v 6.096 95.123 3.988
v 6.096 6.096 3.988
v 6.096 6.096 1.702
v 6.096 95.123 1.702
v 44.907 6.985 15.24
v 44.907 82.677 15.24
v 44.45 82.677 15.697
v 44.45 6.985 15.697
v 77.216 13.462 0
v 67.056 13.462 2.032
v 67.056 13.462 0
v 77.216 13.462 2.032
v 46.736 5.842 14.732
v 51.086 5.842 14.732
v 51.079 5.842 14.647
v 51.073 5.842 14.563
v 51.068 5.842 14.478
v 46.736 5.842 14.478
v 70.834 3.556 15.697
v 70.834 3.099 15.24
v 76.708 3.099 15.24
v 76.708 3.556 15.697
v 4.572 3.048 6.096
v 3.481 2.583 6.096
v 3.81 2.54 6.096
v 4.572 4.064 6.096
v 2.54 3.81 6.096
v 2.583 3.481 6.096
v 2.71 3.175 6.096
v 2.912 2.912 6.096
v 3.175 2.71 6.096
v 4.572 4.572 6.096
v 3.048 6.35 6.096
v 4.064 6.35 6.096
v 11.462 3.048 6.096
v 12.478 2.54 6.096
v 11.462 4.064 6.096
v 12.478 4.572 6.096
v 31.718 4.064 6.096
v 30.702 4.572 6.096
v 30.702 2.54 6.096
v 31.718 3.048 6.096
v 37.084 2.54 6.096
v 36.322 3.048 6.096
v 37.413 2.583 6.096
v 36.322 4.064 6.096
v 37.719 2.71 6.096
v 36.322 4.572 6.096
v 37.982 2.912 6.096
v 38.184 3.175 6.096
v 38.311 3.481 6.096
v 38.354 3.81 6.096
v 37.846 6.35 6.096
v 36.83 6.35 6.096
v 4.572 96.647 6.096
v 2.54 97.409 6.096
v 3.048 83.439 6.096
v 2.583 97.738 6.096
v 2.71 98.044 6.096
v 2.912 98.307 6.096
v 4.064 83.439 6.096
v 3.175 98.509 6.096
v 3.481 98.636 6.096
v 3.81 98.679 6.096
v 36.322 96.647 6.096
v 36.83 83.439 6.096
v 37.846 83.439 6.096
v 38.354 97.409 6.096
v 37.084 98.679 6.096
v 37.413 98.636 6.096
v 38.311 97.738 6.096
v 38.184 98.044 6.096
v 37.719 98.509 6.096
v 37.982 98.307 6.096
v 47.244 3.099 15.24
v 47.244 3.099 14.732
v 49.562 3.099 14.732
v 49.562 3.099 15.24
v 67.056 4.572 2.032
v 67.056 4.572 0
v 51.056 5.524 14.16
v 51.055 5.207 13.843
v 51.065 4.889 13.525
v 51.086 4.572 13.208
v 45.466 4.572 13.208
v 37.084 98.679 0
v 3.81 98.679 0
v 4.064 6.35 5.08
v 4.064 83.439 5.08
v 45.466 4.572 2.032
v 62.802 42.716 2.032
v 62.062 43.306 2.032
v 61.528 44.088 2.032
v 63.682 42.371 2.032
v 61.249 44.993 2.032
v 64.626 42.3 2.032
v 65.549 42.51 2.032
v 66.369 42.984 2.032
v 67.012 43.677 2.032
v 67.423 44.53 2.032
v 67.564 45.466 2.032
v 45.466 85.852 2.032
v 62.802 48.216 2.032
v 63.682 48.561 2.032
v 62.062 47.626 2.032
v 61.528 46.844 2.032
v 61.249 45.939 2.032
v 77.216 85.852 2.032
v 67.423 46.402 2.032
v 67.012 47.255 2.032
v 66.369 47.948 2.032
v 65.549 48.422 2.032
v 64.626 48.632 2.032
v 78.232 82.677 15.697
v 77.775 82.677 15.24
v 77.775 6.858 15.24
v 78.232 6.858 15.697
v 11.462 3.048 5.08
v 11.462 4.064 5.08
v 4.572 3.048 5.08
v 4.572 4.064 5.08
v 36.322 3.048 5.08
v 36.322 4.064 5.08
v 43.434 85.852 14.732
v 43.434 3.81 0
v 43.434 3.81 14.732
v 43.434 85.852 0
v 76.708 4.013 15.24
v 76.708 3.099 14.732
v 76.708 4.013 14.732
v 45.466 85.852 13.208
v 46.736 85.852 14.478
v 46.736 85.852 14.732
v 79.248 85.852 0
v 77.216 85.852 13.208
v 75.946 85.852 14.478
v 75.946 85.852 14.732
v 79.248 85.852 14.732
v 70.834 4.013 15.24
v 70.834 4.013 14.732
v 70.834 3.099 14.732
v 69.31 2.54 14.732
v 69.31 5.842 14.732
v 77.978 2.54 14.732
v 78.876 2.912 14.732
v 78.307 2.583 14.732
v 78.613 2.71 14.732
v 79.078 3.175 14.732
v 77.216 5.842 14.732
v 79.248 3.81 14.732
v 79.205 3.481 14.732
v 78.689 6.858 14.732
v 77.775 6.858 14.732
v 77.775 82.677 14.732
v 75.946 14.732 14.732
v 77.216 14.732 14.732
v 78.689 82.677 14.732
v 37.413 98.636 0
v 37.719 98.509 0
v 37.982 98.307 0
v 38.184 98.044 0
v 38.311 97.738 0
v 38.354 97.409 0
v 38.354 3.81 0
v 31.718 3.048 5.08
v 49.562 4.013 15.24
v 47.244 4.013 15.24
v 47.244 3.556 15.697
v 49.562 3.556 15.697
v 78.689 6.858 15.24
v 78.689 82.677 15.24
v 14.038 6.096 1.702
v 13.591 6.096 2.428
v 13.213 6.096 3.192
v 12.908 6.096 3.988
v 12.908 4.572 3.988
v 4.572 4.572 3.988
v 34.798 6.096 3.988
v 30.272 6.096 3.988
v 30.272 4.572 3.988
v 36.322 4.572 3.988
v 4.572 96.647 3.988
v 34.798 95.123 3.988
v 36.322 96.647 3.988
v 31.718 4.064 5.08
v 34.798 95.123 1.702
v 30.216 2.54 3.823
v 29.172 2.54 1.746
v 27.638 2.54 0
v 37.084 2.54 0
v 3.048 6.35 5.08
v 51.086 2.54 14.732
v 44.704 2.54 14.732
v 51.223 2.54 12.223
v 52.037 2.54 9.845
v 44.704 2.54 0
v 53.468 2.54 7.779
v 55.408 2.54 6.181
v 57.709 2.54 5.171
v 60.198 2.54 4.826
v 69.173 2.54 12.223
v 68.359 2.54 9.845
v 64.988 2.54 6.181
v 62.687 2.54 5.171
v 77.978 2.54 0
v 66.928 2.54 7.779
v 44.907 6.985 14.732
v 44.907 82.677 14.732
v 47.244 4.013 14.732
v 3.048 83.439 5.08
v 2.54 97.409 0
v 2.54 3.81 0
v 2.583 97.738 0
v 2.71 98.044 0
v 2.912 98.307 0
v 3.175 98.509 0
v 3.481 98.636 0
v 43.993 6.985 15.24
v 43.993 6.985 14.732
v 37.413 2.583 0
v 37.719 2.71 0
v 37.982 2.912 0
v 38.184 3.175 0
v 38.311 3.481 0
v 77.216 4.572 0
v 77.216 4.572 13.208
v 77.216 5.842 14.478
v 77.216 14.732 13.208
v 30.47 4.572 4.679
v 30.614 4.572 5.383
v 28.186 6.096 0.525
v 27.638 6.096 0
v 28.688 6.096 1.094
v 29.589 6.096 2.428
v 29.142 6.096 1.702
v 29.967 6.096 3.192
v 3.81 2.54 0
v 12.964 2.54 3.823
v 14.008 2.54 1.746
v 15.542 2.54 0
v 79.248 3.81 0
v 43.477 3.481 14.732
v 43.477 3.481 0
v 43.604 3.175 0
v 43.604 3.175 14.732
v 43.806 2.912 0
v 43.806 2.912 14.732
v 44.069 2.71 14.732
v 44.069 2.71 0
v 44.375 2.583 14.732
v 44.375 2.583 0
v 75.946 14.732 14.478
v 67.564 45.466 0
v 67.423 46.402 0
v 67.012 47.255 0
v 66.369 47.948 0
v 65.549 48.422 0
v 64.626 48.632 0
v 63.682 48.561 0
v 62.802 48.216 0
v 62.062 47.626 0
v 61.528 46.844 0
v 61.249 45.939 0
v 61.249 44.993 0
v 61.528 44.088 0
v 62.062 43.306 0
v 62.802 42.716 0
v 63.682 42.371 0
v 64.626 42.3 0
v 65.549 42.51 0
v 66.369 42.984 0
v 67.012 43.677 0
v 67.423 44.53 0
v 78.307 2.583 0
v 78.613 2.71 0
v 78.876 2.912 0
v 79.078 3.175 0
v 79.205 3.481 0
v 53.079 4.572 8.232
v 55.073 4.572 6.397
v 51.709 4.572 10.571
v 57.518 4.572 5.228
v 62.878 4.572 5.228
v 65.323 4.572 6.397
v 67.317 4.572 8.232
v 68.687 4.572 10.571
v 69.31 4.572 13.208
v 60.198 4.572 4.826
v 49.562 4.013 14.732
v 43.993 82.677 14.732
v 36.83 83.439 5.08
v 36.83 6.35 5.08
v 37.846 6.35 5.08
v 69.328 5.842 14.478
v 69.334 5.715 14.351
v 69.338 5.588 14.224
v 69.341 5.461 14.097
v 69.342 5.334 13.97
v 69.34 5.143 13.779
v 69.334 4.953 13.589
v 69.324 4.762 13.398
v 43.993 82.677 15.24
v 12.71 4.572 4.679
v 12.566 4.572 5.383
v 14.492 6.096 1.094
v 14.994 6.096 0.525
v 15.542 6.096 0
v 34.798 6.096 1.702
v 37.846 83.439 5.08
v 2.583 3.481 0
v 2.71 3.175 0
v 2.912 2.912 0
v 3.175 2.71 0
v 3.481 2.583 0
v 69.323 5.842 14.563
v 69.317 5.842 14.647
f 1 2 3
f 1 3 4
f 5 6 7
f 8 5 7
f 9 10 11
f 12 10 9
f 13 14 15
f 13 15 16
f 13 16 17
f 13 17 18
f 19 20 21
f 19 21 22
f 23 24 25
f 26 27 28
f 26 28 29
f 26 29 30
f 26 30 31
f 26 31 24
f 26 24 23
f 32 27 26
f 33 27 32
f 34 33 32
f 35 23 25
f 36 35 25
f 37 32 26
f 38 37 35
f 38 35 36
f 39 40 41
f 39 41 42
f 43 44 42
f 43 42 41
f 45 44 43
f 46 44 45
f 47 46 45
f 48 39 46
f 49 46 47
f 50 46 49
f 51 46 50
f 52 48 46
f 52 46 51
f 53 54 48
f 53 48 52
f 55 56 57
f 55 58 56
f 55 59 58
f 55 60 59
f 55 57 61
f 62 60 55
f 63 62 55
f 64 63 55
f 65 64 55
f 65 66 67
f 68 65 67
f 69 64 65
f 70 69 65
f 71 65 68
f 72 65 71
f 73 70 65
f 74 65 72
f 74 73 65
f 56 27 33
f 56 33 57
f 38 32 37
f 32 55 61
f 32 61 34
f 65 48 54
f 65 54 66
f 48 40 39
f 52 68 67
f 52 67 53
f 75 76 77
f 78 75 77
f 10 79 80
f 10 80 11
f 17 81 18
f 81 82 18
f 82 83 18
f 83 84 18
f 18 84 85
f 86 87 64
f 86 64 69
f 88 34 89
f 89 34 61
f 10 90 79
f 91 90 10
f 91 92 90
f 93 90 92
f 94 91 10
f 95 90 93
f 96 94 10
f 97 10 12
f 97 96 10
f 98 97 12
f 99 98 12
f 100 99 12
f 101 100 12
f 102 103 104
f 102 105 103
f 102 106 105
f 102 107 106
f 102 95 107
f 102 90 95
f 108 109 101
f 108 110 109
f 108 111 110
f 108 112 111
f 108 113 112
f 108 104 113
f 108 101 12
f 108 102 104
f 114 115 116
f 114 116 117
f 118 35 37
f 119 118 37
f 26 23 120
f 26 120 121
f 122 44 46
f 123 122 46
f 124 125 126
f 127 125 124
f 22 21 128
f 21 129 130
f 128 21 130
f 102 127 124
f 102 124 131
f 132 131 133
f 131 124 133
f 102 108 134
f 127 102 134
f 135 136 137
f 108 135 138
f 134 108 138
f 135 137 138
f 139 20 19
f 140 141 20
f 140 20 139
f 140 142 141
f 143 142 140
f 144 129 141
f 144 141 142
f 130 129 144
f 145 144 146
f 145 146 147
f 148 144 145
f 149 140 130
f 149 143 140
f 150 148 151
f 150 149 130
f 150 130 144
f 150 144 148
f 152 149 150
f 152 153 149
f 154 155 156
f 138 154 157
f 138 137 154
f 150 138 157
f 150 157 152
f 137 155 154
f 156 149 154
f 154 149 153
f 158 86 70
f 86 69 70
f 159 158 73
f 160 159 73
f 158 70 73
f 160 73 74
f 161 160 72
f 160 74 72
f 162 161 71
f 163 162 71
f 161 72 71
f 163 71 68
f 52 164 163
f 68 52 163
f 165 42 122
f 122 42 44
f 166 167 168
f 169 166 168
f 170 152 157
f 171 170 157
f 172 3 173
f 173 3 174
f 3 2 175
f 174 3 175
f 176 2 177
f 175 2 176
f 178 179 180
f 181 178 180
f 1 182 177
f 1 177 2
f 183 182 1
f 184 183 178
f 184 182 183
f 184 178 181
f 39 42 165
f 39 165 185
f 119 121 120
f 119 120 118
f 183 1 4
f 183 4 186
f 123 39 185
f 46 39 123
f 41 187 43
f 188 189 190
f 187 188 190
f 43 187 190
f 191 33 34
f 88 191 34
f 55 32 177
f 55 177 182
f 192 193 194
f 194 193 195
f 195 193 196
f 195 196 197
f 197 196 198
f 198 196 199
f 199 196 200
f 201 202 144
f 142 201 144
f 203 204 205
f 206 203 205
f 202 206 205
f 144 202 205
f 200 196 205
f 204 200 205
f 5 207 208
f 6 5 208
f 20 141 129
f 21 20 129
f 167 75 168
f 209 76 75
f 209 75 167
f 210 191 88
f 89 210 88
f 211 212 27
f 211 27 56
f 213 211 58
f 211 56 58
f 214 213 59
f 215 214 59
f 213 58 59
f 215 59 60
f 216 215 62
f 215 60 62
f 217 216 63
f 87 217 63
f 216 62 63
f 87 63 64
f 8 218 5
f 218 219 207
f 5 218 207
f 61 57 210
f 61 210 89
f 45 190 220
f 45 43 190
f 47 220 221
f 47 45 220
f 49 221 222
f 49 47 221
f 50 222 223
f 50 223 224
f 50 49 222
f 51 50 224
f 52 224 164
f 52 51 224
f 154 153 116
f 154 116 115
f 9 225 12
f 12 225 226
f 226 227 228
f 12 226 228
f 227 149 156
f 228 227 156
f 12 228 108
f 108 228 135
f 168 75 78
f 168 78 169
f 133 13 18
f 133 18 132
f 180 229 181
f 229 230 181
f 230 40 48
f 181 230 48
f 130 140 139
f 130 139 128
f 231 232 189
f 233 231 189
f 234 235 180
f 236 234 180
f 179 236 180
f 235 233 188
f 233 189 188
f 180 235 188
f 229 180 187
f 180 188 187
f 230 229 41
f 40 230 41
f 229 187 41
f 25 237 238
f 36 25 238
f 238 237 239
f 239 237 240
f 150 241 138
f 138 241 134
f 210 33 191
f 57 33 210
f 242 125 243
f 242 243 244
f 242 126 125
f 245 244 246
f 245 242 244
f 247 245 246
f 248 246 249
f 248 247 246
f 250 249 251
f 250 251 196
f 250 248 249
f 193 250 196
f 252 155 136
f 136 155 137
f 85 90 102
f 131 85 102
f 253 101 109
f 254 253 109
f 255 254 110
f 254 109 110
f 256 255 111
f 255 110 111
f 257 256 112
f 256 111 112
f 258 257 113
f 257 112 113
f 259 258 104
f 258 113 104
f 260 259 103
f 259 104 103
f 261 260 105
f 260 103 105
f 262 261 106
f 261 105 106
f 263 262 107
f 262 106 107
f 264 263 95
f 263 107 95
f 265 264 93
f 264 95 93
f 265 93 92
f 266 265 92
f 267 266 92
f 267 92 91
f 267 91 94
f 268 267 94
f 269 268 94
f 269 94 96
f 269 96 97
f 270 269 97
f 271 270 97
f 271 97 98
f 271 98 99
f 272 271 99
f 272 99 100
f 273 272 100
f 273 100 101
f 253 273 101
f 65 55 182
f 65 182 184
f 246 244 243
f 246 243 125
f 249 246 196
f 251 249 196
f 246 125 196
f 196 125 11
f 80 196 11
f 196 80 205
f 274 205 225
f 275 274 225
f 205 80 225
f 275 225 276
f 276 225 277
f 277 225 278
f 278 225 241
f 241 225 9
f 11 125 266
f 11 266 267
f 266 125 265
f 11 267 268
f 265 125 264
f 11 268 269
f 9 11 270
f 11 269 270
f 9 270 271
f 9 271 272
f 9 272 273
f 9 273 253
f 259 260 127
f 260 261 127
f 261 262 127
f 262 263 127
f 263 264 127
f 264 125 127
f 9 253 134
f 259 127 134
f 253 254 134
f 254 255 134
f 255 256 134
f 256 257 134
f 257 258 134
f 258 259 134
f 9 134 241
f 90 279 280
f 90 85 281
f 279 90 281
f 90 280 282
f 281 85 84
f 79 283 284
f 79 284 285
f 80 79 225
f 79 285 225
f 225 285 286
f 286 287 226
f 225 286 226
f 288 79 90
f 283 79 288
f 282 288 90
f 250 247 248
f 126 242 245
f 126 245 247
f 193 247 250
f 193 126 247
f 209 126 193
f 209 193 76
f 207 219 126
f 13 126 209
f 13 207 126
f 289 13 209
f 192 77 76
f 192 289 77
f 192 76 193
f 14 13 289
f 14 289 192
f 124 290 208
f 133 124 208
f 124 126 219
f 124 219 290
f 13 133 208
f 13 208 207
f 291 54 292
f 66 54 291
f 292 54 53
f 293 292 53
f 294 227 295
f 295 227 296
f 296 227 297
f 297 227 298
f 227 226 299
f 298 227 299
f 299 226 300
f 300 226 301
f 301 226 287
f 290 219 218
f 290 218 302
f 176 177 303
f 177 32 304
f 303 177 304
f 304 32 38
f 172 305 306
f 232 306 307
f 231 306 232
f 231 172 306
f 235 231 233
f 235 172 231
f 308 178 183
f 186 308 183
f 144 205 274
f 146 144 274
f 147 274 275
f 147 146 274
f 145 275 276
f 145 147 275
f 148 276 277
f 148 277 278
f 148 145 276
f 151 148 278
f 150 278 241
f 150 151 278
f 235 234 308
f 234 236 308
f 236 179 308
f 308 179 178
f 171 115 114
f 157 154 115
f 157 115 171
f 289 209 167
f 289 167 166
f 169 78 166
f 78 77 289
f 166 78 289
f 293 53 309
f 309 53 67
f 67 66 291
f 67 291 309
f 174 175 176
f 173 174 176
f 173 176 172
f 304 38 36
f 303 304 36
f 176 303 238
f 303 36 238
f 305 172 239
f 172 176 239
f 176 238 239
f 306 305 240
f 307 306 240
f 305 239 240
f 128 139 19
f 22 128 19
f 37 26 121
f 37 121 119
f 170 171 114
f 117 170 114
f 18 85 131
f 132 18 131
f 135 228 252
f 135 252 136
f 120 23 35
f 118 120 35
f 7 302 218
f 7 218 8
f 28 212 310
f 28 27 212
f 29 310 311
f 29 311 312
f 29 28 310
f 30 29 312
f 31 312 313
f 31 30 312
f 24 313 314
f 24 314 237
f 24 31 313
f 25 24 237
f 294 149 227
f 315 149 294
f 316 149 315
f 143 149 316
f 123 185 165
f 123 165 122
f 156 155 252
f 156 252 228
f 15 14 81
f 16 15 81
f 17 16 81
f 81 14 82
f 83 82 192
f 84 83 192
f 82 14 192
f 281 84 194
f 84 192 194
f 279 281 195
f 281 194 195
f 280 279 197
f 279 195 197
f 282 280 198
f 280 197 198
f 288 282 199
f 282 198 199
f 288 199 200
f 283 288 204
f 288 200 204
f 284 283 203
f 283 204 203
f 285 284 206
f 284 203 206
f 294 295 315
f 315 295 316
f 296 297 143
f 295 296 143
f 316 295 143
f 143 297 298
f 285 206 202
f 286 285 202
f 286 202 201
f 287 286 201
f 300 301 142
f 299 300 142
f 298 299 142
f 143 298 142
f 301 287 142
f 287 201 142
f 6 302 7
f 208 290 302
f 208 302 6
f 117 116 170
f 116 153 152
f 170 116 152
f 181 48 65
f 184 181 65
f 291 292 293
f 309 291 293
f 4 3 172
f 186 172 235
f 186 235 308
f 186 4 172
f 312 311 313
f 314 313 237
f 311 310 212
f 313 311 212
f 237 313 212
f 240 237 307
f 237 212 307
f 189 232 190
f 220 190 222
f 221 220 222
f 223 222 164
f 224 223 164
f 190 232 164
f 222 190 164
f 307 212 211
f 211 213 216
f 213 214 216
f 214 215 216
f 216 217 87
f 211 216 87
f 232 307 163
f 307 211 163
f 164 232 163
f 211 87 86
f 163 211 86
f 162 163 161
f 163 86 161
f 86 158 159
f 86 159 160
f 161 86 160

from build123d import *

# Parameters (mm, degrees)
F0_W         = 35.814
F0_H         = 96.139
F1_DEPTH     = 6.096
F2_W         = 28.702
F2_H         = 89.027
F3_DEPTH     = 4.3942
F4_W         = 31.75
F4_H         = 92.075
F4_W_2       = 28.702
F4_H_2       = 89.027
F5_DEPTH     = 2.1082
F6_W         = 35.814
F6_H         = 96.012
F7_DEPTH     = 14.732
F8_T         = -2.032
F9_W         = 35.814
F9_H         = 12.7
F9_W_2       = 10.16
F9_H_2       = 8.89
F9_R         = 3.175
F10_DEPTH    = 14.733
F11_W        = 1.27
F11_H        = 71.12
F12_DEPTH    = 1.524
F13_SIZE     = 1.26999
F14_R        = 1.27
F14_2_R      = 1.27
F15_R        = 9.144
F16_DEPTH    = 96.14
F17_DEPTH    = 3.556
F18_W        = 6.8898053138
F18_H        = 1.016
F18_W_2      = 1.016
F18_H_2      = 77.089
F18_W_3      = 4.6038053138
F19_DEPTH    = 1.016
F20_W        = 2.3178053138
F20_H        = 0.9144
F20_W_2      = 0.9144
F20_H_2      = 75.692
F20_W_3      = 5.8738053138
F20_H_3      = 75.819
F21_DEPTH    = 1.143
F22_T1_DEPTH = 5.5838427085
F22_T3_DEPTH = 78.9580373947
F22_T5_DEPTH = 9.1398427085
F22_T7_DEPTH = 79.0850373947


# Not quite as in the source:
# - a fillet or chamfer that OpenCascade refuses, or shapes differently, is made with other operations: its cross-section is extruded or revolved along the edge and cut away or added
# - a fillet or chamfer is up to 0.001 mm smaller than in the source, because OpenCascade refuses the exact size
# - a feature names something its author has since deleted; it is built from what else it names


with BuildPart() as f1:
    # F0 (on Top) → F1 (new body)
    with BuildSketch(Plane.XY):
        with Locations((20.447, 50.6095)):
            Rectangle(F0_W, F0_H)
    extrude(amount=F1_DEPTH)

    # F2 (on face) → F3 (cut)
    with BuildSketch(Plane.XY.offset(6.096)):
        with Locations((20.447, 50.6095)):
            Rectangle(F2_W, F2_H)
    extrude(amount=-F3_DEPTH, mode=Mode.SUBTRACT)

    # F4 (on face) → F5 (cut)
    with BuildSketch(Plane.XY.offset(6.096)):
        with Locations((20.447, 50.6095)):
            Rectangle(F4_W, F4_H)
        with Locations((20.447, 50.6095)):
            Rectangle(F4_W_2, F4_H_2, mode=Mode.SUBTRACT)
    extrude(amount=-F5_DEPTH, mode=Mode.SUBTRACT)

    # F14
    f14_edges = [f1.edges().sort_by_distance(p)[0] for p in [
        (38.354, 2.54, 3.048),
        (38.354, 98.679, 3.048),
        (2.54, 2.54, 3.048),
        (2.54, 98.679, 3.048),
    ]]
    fillet(f14_edges, radius=F14_R)

    # F15 (on face) → F17 (cut)
    with BuildSketch(Plane.XZ.offset(-2.54)):
        with Locations((60.198, 13.97)):
            Circle(F15_R)
        with Locations((21.59, 6.858)):
            Circle(F15_R)
    extrude(amount=-F17_DEPTH, mode=Mode.SUBTRACT)

    # F18 (on face) → F19 (cut)
    with BuildSketch(Plane.XY.offset(6.096)):
        with Locations((8.0169026569, 3.556)):
            Rectangle(F18_W, F18_H)
        with Locations((3.556, 44.8945)):
            Rectangle(F18_W_2, F18_H_2)
        with Locations((37.338, 44.8945)):
            Rectangle(F18_W_2, F18_H_2)
        with Locations((34.0200973431, 3.556)):
            Rectangle(F18_W_3, F18_H)
    extrude(amount=-F19_DEPTH, mode=Mode.SUBTRACT)


with BuildPart() as f7:
    # F6 (on Top) → F7 (new body)
    with BuildSketch(Plane.XY):
        with Locations((61.341, 50.546)):
            Rectangle(F6_W, F6_H)
    extrude(amount=F7_DEPTH)

    # F8
    f8_openings = [f7.faces().sort_by_distance(p)[0] for p in [
        (61.341, 50.546, 14.732),
    ]]
    offset(amount=F8_T, openings=f8_openings)

    # F9 (on face) → F10 (cut, through all)
    with BuildSketch(Plane.XY.offset(14.732)):
        with Locations((61.341, 92.202)):
            Rectangle(F9_W, F9_H)
        with Locations((72.136, 9.017)):
            Rectangle(F9_W_2, F9_H_2)
        with Locations((64.389, 45.466)):
            Circle(F9_R)
    extrude(amount=-F10_DEPTH, mode=Mode.SUBTRACT)

    # F11 (on face) → F12 (join)
    with BuildSketch(Plane.XY.offset(14.732)):
        with Locations((76.581, 50.292)):
            Rectangle(F11_W, F11_H)
        Polygon((45.466, 85.852), (45.466, 4.572), (77.216, 4.572), (77.216, 5.842), (46.736, 5.842), (46.736, 85.852), align=None)
    extrude(amount=-F12_DEPTH)

    # F13 (size 1.27 in the source; OpenCascade refuses exactly that, so slightly less here)
    f13_edges = [f7.edges().sort_by_distance(p)[0] for p in [
        (61.976, 5.842, 13.208),
        (75.946, 50.292, 13.208),
        (46.736, 45.847, 13.208),
    ]]
    chamfer(f13_edges, length=F13_SIZE)

    # F14#2
    f14_2_edges = [f7.edges().sort_by_distance(p)[0] for p in [
        (79.248, 2.54, 7.366),
        (43.434, 2.54, 7.366),
    ]]
    fillet(f14_2_edges, radius=F14_2_R)

    # F15 (on face) → F16 (cut, through all)
    with BuildSketch(Plane.XZ.offset(-2.54)):
        with Locations((60.198, 13.97)):
            Circle(F15_R)
        with Locations((21.59, 6.858)):
            Circle(F15_R)
    extrude(amount=-F16_DEPTH, mode=Mode.SUBTRACT)

    # F20 (on face) → F21 (join)
    with BuildSketch(Plane.XY.offset(14.732)):
        with Locations((48.4029026569, 3.556)):
            Rectangle(F20_W, F20_H)
        with Locations((44.45, 44.831)):
            Rectangle(F20_W_2, F20_H_2)
        with Locations((73.7710973431, 3.556)):
            Rectangle(F20_W_3, F20_H)
        with Locations((78.232, 44.7675)):
            Rectangle(F20_W_2, F20_H_3)
    extrude(amount=F21_DEPTH)

    # F22: chamfer of 0.635 on 8 edges, made by hand

    # F22_s2 → F22_t1 (cut)
    with BuildSketch(Plane.YZ.offset(45.6109813026)):
        Polygon((3.0988, 15.24), (3.7338, 15.875), (3.0988, 15.875), align=None)
        Polygon((4.0132, 15.24), (3.3782, 15.875), (4.0132, 15.875), align=None)
    extrude(amount=F22_T1_DEPTH, mode=Mode.SUBTRACT)

    # F22_s4 → F22_t3 (cut)
    with BuildSketch(Plane.XZ.offset(-84.3100186974)):
        Polygon((44.9072, 15.24), (44.2722, 15.875), (44.9072, 15.875), align=None)
        Polygon((43.9928, 15.24), (44.6278, 15.875), (43.9928, 15.875), align=None)
    extrude(amount=F22_T3_DEPTH, mode=Mode.SUBTRACT)

    # F22_s6 → F22_t5 (cut)
    with BuildSketch(Plane.YZ.offset(69.2011759889)):
        Polygon((3.0988, 15.24), (3.7338, 15.875), (3.0988, 15.875), align=None)
        Polygon((4.0132, 15.24), (3.3782, 15.875), (4.0132, 15.875), align=None)
    extrude(amount=F22_T5_DEPTH, mode=Mode.SUBTRACT)

    # F22_s8 → F22_t7 (cut)
    with BuildSketch(Plane.XZ.offset(-84.3100186974)):
        Polygon((78.6892, 15.24), (78.0542, 15.875), (78.6892, 15.875), align=None)
        Polygon((77.7748, 15.24), (78.4098, 15.875), (77.7748, 15.875), align=None)
    extrude(amount=F22_T7_DEPTH, mode=Mode.SUBTRACT)


solid = Compound([f1.part, f7.part])
